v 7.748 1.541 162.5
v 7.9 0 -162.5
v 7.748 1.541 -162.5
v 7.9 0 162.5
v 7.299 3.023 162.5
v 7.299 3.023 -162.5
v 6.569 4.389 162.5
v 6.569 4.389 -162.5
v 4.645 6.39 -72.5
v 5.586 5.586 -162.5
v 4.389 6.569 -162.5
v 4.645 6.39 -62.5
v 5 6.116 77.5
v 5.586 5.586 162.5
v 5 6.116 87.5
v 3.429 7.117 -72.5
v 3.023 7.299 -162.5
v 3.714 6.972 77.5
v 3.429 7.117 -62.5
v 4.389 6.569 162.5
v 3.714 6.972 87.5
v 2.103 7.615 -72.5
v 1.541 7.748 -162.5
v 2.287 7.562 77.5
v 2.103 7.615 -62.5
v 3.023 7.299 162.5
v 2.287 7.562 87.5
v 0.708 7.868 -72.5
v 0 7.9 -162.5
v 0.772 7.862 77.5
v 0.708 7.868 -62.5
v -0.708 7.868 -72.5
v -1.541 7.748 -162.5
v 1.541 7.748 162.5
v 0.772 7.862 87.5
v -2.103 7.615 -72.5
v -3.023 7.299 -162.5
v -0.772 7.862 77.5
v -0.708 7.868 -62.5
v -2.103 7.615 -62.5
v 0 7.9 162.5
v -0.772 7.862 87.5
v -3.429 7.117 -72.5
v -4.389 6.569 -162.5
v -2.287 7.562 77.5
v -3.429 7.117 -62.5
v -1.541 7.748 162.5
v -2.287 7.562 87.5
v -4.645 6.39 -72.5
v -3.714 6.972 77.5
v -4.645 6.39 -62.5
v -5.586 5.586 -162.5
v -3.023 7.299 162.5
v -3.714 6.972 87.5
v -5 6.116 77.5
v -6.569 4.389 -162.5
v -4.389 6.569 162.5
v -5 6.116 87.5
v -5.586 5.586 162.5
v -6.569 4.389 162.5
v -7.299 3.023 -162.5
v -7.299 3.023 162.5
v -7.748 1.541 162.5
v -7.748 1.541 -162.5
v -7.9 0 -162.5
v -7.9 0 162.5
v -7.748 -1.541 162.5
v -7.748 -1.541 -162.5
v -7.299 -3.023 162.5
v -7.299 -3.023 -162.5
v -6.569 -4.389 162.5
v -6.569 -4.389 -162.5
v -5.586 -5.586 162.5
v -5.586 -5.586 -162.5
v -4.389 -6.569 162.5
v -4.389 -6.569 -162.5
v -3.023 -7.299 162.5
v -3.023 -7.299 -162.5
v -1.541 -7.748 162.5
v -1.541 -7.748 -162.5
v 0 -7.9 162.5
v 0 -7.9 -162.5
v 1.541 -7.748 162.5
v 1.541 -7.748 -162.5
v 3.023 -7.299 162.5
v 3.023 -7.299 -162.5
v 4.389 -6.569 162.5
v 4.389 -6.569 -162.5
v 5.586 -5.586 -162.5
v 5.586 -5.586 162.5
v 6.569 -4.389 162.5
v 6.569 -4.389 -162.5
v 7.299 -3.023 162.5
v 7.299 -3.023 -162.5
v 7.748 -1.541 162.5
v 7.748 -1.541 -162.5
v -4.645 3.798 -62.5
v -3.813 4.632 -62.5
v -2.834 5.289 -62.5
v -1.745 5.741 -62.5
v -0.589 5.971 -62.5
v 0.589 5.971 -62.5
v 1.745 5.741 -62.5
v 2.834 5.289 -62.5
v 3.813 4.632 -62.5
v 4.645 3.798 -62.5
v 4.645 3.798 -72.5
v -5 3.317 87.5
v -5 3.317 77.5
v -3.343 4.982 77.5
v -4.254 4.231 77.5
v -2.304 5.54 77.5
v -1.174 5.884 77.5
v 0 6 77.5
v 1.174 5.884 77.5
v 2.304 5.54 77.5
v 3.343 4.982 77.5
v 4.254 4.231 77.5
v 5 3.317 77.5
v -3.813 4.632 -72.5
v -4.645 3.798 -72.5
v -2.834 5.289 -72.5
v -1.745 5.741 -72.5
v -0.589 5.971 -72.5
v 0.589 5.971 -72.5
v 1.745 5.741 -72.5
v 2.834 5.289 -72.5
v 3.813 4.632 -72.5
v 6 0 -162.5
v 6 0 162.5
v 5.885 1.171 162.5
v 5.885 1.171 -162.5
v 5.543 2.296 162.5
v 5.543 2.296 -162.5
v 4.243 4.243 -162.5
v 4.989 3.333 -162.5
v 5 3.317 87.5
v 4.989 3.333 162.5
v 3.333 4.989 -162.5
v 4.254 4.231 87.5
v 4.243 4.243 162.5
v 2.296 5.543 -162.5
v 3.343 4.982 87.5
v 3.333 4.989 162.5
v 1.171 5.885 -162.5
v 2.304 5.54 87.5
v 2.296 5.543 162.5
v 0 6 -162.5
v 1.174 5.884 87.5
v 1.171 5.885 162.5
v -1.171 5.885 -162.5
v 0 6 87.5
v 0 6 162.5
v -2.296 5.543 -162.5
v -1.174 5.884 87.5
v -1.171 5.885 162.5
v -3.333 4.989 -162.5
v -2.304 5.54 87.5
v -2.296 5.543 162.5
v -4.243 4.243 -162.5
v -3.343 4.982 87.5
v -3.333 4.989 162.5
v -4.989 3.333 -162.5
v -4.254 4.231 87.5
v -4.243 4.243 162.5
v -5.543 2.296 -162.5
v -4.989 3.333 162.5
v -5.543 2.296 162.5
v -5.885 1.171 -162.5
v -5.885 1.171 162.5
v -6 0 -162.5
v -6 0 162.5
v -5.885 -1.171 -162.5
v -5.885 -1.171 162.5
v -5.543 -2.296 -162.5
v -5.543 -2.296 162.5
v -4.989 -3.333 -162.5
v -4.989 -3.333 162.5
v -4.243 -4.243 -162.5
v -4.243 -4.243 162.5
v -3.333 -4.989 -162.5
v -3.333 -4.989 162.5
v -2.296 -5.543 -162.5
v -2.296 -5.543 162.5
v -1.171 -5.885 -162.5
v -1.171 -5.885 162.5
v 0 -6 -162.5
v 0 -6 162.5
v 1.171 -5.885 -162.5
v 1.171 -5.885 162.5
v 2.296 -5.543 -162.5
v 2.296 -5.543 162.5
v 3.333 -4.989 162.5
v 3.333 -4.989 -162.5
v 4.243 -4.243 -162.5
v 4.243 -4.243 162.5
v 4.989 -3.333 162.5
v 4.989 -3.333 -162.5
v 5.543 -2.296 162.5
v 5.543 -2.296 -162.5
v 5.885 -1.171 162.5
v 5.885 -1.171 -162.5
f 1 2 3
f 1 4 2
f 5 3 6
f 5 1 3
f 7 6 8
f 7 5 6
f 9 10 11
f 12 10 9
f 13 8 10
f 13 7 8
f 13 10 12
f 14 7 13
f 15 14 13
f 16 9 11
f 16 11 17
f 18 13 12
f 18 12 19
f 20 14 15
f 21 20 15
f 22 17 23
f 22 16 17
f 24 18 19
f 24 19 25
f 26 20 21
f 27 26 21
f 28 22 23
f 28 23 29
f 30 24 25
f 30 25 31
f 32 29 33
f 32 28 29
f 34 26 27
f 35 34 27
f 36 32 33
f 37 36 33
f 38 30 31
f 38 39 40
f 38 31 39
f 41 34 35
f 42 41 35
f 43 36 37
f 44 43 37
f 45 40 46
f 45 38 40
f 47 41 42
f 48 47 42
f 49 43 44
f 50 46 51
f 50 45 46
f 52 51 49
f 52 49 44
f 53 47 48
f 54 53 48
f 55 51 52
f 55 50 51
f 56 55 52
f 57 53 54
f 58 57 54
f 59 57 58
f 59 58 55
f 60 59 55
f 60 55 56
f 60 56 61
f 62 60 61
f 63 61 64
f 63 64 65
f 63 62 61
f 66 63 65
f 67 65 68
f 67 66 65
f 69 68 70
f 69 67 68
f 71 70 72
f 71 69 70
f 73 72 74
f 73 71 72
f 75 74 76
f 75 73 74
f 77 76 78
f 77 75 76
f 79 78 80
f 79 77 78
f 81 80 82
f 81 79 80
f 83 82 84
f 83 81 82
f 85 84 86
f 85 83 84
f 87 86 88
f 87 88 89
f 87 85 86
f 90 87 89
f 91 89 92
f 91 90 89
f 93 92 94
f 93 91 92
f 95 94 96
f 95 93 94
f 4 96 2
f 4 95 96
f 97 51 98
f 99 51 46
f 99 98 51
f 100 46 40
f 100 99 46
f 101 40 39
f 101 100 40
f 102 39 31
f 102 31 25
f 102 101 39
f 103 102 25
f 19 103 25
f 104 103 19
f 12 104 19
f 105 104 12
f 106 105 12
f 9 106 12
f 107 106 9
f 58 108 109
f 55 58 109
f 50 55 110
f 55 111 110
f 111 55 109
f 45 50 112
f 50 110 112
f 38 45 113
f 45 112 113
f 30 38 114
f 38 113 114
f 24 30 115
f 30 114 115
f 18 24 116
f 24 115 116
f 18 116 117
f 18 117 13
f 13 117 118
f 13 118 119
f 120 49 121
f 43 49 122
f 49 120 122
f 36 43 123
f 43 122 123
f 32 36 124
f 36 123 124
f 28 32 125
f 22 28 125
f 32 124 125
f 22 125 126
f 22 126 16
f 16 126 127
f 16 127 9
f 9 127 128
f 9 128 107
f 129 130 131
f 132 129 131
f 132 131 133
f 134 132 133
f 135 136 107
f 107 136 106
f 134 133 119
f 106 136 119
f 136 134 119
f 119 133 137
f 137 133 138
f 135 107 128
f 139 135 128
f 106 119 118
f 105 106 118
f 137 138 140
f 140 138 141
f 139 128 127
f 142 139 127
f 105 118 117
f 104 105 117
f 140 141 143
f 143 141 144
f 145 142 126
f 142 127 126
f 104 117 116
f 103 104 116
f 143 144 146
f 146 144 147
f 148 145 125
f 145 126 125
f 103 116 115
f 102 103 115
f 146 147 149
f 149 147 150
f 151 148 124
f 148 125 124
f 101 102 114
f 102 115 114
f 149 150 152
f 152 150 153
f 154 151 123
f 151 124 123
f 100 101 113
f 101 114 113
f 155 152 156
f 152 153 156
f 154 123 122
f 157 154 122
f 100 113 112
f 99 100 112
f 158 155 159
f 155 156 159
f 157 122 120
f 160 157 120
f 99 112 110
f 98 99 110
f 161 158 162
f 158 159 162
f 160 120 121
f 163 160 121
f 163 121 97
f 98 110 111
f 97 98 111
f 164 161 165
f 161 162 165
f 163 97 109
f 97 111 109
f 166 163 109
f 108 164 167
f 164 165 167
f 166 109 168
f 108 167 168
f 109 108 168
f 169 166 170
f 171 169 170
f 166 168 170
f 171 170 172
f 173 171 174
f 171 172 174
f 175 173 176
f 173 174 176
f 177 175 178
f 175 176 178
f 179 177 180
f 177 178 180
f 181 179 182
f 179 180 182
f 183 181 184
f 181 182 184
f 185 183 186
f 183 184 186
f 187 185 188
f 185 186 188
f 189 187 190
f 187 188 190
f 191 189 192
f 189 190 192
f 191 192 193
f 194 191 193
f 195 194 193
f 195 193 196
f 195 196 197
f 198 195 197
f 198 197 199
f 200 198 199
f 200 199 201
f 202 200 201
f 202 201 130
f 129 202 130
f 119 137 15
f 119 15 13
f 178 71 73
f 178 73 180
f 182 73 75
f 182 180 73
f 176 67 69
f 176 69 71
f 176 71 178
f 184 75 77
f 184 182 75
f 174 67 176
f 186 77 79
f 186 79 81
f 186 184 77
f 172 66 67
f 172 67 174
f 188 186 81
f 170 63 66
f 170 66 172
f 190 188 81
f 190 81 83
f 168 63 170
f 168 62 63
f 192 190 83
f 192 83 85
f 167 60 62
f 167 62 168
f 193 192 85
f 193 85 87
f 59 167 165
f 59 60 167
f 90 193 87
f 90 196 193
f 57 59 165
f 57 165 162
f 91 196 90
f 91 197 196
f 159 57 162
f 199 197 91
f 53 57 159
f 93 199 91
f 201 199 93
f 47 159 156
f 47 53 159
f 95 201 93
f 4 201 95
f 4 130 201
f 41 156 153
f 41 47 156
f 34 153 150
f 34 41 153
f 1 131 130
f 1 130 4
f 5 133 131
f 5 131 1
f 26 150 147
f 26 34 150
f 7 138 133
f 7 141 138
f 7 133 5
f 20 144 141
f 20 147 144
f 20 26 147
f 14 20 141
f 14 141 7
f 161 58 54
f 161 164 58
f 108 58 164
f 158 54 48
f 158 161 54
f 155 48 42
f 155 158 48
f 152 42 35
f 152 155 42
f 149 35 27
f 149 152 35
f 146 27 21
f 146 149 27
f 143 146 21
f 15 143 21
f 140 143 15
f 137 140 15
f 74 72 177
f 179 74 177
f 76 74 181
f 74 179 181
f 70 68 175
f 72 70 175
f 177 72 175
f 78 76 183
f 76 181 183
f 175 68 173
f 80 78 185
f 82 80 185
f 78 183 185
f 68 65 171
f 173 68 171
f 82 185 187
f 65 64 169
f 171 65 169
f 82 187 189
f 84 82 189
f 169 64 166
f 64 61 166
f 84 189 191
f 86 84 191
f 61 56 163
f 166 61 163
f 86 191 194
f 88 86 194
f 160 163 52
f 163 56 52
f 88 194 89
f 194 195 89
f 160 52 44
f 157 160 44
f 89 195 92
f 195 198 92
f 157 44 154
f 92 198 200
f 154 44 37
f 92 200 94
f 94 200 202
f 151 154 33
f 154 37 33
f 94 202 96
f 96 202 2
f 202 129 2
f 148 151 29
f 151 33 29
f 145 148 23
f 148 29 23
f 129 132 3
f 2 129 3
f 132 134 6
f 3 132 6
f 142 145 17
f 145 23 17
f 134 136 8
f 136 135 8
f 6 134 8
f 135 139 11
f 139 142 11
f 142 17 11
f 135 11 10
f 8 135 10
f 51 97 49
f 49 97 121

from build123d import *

# Parameters (mm, degrees)
CROQUIS1_R                 = 7.9
SALIENTE_EXTRUIR1_DEPTH    = 162.5
CROQUIS3_R                 = 6
CORTAR_EXTRUIR1_DEPTH      = 326.191974071
CORTAR_EXTRUIR2_REACH      = 164.884
CORTAR_EXTRUIR2_END_RADIUS = 7.9
CROQUIS4_W                 = 10
CROQUIS4_H                 = 10
CORTAR_EXTRUIR3_REACH      = 164.884
CORTAR_EXTRUIR3_END_RADIUS = 7.9
CROQUIS5_W                 = 9.290487028
CROQUIS5_H                 = 10


with BuildPart() as part:
    # Croquis1 → Saliente-Extruir1 (new, symmetric)
    with BuildSketch(Plane.XY):
        Circle(CROQUIS1_R)
    extrude(amount=SALIENTE_EXTRUIR1_DEPTH, both=True)

    # Croquis3 → Cortar-Extruir1 (cut, through all)
    with BuildSketch(Plane.XY.offset(162.5)):
        Circle(CROQUIS3_R)
    extrude(amount=-CORTAR_EXTRUIR1_DEPTH, mode=Mode.SUBTRACT)

    # Cortar-Extruir2: up to this cylinder (the profile starts inside it)
    cortar_extruir2_end = Plane(origin=(0, 0, 82.5), z_dir=(0, 0, -1)) * Cylinder(CORTAR_EXTRUIR2_END_RADIUS, 346.568, mode=Mode.PRIVATE)
    # Croquis4 → Cortar-Extruir2 (cut, up to the surface)
    with BuildSketch(Plane(origin=(0, 0, 0), x_dir=(1, 0, 0), z_dir=(0, 1, 0)), mode=Mode.PRIVATE) as cortar_extruir2_sk1:
        with Locations((0, -82.5)):
            Rectangle(CROQUIS4_W, CROQUIS4_H)
    cortar_extruir2_tool1 = extrude(cortar_extruir2_sk1.sketch, amount=CORTAR_EXTRUIR2_REACH, mode=Mode.PRIVATE) & cortar_extruir2_end
    add(cortar_extruir2_tool1.solids().sort_by_distance((0, 0, 82.5))[0], mode=Mode.SUBTRACT)

    # Cortar-Extruir3: up to this cylinder (the profile starts inside it)
    cortar_extruir3_end = Plane(origin=(0, 0, -67.5), z_dir=(0, 0, -1)) * Cylinder(CORTAR_EXTRUIR3_END_RADIUS, 346.568, mode=Mode.PRIVATE)
    # Croquis5 → Cortar-Extruir3 (cut, up to the surface)
    with BuildSketch(Plane(origin=(0, 0, 0), x_dir=(1, 0, 0), z_dir=(0, 1, 0)), mode=Mode.PRIVATE) as cortar_extruir3_sk1:
        with Locations((0, 67.5)):
            Rectangle(CROQUIS5_W, CROQUIS5_H)
    cortar_extruir3_tool1 = extrude(cortar_extruir3_sk1.sketch, amount=CORTAR_EXTRUIR3_REACH, mode=Mode.PRIVATE) & cortar_extruir3_end
    add(cortar_extruir3_tool1.solids().sort_by_distance((0, 0, -67.5))[0], mode=Mode.SUBTRACT)


solid = part.part
